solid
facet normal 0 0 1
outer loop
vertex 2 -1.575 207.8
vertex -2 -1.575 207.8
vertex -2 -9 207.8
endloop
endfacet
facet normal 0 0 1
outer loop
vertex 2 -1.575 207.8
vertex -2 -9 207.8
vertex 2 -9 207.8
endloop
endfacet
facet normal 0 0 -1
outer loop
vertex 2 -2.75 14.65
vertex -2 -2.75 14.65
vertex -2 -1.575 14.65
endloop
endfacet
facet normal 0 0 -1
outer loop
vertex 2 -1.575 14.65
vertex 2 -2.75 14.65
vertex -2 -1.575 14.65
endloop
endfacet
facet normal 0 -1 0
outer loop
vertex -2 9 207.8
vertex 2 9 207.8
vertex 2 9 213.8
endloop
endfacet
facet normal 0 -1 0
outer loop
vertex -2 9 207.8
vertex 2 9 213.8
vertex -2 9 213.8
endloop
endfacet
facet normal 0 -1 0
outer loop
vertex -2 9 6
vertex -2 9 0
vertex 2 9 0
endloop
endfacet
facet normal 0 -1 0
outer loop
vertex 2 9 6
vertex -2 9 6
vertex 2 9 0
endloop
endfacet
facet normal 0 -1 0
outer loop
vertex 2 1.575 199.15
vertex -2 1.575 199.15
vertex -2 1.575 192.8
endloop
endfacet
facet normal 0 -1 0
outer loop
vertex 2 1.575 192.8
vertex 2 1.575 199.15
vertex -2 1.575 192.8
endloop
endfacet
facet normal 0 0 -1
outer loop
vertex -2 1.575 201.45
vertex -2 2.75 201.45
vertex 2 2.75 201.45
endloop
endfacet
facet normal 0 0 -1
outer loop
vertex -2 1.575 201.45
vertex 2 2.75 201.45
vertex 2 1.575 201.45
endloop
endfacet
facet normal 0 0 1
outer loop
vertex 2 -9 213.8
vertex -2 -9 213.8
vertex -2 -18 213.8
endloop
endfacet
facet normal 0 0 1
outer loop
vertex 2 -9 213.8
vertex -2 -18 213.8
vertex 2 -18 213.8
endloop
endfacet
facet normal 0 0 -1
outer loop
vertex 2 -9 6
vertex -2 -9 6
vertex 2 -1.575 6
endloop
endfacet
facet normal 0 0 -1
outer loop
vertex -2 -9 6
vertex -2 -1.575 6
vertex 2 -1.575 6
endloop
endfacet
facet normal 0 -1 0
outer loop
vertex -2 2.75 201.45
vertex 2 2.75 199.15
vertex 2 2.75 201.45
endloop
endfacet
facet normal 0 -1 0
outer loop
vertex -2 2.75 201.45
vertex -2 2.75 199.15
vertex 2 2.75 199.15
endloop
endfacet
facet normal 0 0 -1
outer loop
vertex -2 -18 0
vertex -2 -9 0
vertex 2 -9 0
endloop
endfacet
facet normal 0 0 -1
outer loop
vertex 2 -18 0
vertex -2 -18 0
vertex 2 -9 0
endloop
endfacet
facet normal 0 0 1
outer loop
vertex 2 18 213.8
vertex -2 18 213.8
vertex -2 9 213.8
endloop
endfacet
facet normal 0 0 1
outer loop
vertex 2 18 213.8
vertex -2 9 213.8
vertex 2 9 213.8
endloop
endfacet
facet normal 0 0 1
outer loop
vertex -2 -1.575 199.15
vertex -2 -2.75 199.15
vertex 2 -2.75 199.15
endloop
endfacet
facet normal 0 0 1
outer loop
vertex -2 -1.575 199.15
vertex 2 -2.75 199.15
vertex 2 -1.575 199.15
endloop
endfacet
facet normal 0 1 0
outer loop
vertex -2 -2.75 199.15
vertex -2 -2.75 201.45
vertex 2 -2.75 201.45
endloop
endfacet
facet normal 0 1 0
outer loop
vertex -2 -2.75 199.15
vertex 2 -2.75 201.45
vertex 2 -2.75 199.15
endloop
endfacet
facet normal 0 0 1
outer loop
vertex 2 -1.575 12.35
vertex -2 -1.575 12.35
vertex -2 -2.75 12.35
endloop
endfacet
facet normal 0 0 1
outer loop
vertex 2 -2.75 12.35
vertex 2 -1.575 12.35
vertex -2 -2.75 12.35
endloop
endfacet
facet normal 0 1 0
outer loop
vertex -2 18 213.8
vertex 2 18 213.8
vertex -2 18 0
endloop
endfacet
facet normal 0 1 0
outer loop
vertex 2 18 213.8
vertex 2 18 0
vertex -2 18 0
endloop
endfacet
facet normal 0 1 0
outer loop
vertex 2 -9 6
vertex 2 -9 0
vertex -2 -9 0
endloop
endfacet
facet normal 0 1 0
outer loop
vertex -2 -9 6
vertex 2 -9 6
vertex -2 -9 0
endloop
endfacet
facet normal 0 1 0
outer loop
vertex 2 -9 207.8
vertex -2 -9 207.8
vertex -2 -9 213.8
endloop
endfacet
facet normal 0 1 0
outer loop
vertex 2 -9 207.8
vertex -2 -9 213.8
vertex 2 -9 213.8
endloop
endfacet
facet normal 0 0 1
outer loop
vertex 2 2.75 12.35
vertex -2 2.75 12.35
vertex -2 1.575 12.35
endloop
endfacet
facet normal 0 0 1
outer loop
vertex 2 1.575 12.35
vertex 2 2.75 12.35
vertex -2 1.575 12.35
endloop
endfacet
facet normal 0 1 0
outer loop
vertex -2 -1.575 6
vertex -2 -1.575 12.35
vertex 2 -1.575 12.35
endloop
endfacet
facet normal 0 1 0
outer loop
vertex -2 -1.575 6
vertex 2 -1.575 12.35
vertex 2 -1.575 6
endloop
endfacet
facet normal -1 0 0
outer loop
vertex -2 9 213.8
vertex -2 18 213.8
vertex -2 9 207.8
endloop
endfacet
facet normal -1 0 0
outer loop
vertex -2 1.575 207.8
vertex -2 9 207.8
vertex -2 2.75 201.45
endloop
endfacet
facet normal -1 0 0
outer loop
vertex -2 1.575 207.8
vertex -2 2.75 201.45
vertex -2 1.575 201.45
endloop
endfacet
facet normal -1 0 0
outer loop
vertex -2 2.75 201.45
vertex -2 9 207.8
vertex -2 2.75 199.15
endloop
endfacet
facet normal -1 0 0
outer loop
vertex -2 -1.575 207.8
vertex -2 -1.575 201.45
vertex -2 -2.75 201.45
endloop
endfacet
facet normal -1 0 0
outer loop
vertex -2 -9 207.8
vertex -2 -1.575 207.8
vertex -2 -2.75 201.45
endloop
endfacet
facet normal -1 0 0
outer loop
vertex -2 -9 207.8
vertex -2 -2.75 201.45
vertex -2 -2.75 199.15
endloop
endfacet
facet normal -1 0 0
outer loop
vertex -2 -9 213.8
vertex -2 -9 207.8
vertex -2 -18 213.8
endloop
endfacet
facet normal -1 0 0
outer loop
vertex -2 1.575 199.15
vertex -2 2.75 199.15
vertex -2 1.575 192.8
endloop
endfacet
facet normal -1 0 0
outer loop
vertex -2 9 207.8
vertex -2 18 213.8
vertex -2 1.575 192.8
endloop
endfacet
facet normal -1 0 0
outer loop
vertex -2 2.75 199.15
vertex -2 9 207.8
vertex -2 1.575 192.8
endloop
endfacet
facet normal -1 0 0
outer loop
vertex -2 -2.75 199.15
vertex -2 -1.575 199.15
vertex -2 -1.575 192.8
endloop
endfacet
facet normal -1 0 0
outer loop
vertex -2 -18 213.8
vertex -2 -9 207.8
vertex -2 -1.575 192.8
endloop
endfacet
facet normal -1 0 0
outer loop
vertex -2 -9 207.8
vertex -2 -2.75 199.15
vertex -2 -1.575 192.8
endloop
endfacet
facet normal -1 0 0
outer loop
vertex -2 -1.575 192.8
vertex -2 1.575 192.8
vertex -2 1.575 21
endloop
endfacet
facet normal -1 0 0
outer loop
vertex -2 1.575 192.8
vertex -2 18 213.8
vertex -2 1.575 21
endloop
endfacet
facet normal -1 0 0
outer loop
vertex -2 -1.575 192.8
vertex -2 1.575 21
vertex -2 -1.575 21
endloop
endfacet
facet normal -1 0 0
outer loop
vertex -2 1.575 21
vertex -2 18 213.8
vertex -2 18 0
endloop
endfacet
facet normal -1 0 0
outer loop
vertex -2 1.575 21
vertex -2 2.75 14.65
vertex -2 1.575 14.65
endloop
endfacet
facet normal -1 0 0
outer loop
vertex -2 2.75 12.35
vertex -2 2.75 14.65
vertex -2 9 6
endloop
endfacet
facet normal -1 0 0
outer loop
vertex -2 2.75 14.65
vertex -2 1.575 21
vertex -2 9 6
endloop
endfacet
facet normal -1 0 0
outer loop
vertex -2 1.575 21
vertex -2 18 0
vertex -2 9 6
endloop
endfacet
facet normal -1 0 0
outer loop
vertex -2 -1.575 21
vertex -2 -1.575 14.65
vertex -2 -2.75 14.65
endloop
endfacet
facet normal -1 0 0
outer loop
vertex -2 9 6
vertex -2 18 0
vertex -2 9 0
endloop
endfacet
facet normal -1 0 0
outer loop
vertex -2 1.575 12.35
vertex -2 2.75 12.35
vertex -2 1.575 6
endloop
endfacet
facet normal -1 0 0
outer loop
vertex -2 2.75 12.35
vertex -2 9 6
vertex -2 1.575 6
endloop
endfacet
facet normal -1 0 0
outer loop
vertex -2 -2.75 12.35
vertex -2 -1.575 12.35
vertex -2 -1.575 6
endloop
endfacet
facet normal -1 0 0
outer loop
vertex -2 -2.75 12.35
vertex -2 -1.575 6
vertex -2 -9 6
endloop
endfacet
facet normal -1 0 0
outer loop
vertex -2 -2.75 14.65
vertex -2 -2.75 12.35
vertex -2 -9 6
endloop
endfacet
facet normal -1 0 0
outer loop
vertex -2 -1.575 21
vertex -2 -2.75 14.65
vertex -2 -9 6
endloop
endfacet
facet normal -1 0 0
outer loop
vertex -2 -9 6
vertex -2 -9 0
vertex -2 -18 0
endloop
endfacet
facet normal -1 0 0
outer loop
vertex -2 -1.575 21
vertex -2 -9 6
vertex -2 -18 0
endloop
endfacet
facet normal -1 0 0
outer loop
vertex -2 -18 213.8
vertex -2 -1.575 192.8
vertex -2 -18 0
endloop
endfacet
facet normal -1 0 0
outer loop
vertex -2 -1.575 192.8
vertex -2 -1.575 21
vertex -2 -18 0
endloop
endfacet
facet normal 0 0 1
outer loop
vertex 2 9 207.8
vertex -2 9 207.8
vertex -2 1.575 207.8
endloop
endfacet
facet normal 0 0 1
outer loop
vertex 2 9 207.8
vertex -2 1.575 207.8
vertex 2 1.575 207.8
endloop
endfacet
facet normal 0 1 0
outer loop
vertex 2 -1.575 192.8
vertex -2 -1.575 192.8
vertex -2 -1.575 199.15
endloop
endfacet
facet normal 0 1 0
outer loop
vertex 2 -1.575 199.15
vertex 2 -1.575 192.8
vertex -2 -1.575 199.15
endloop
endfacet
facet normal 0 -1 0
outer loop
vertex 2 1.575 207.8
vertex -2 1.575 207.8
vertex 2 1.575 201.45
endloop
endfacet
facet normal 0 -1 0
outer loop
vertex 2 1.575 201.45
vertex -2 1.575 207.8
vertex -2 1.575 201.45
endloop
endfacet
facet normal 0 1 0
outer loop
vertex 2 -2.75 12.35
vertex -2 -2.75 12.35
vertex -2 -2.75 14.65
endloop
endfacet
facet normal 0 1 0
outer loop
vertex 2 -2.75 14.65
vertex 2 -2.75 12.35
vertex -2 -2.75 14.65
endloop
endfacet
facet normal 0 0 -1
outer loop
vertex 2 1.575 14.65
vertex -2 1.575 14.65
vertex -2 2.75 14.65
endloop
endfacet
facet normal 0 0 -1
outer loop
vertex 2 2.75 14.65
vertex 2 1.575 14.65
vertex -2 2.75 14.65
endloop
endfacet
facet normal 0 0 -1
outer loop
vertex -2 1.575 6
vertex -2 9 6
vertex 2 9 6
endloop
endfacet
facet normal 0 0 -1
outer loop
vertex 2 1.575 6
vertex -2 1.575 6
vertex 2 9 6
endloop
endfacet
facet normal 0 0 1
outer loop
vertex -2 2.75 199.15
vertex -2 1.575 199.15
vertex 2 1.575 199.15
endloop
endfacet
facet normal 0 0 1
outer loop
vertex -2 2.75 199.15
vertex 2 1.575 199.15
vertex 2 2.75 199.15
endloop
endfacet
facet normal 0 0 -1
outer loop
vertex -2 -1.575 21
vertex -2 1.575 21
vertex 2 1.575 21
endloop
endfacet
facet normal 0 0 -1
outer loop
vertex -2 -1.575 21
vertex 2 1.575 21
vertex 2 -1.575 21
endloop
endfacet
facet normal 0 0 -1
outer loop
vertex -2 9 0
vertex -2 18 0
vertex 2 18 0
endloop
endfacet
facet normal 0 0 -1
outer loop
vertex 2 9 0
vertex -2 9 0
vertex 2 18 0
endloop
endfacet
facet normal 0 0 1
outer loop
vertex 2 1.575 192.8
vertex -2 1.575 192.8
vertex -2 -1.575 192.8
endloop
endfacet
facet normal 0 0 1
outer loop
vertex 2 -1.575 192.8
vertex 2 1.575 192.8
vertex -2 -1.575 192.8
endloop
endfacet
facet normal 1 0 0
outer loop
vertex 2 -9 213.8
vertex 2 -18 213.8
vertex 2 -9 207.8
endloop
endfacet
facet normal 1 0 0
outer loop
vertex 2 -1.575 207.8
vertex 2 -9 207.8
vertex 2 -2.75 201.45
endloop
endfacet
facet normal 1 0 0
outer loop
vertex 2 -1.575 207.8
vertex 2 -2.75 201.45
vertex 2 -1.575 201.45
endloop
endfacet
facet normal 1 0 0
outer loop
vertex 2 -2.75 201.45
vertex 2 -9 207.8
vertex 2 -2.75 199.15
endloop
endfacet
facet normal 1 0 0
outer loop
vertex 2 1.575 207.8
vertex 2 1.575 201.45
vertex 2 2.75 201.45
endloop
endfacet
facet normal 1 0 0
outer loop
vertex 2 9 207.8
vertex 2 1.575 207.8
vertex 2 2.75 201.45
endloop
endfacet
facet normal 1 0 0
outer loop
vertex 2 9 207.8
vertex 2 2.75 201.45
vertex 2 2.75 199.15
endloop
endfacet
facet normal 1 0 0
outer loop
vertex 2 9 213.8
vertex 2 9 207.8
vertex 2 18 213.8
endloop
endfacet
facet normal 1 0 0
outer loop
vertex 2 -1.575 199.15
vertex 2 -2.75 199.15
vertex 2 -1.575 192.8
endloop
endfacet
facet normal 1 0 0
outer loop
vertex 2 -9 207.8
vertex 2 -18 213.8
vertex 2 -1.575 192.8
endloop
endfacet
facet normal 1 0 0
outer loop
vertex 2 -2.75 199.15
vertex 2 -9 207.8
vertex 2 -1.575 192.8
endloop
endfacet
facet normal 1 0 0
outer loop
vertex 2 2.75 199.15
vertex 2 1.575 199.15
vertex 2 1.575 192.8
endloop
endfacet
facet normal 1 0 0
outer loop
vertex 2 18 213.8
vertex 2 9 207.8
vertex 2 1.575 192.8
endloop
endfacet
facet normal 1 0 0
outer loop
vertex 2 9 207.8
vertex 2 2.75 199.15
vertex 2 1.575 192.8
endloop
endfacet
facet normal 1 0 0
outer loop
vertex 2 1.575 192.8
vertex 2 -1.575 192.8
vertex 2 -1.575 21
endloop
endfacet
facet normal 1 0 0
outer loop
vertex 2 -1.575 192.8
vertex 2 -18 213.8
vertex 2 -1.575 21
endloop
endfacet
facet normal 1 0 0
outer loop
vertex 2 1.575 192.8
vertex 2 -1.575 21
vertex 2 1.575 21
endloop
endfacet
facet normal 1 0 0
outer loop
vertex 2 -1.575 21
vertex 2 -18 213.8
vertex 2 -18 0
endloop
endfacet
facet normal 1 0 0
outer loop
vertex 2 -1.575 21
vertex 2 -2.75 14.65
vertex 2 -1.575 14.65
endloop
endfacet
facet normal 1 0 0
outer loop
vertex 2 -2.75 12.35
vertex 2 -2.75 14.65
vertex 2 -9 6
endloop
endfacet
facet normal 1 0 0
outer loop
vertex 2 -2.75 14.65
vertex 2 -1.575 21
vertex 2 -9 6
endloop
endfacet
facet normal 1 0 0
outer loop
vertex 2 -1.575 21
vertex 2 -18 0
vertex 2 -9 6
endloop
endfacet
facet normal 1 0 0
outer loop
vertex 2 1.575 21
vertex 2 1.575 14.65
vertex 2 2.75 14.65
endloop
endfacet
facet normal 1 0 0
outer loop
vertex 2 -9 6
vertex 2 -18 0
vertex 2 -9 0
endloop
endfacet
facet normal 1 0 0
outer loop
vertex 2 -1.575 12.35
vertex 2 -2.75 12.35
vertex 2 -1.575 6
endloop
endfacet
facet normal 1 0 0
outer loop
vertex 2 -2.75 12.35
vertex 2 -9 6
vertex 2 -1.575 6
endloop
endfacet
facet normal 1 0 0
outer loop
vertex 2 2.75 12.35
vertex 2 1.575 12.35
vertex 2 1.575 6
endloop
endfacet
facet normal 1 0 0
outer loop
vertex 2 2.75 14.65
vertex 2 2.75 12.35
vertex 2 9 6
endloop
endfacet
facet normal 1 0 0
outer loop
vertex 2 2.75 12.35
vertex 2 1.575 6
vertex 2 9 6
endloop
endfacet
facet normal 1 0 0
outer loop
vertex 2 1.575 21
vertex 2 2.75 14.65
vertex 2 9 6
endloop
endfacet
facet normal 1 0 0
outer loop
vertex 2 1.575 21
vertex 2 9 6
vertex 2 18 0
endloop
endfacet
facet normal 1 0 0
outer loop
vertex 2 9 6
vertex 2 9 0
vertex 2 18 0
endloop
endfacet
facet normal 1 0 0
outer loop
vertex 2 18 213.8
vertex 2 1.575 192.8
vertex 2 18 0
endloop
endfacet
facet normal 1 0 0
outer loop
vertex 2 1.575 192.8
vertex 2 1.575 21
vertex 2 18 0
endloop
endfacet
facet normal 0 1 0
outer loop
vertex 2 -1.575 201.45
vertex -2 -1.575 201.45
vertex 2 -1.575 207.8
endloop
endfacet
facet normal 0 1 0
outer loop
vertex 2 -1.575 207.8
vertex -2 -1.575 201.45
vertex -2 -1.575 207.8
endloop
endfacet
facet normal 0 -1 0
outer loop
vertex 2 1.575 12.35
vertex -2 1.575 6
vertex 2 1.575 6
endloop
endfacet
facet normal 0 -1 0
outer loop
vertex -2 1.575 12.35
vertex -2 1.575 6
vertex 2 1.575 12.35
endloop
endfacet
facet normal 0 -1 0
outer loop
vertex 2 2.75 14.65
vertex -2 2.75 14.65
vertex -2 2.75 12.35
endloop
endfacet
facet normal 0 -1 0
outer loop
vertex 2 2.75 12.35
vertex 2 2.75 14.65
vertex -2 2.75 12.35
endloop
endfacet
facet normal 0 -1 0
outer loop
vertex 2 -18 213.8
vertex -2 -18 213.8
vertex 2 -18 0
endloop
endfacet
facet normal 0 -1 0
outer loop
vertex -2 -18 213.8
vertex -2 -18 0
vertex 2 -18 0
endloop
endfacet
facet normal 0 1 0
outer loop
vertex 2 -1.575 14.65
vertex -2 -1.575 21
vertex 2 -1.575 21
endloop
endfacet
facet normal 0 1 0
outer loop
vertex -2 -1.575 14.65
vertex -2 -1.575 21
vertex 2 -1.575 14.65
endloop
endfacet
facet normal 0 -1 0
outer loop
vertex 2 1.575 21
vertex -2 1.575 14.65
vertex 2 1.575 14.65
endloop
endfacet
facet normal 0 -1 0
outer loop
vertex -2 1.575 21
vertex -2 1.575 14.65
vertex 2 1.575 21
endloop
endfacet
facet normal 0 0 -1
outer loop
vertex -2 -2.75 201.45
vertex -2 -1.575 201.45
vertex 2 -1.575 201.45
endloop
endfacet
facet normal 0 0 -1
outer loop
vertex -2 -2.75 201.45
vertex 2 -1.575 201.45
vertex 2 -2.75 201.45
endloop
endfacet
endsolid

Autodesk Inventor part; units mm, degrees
ref_plane "YZ Plane" through (0, 0, 0) normal (1, 0, 0) x (0, 1, 0)
ref_plane "XZ Plane" through (0, 0, 0) normal (0, 1, 0) x (-1, 0, 0)
ref_plane "XY Plane" through (0, 0, 0) normal (0, 0, 1) x (1, 0, 0)
sketch "Эскиз1" plane through (0, 0, 0) normal (0, 0, 1) x (1, 0, 0)
  line L0 (-2, 18) -> (2, 18)
  line L1 (2, -18) -> (-2, -18)
  line L2 (-2, 18) -> (2, -18) construction
  line L3 (2, 18) -> (-2, -18) construction
  line L4 (-2, 9) -> (2, 9)
  line L5 (2, -9) -> (-2, -9)
  line L6 (-2, 9) -> (2, -9) construction
  line L7 (2, 9) -> (-2, -9) construction
  line L8 (-2, -18) -> (-2, -9)
  line L9 (-2, 9) -> (-2, 18)
  line L10 (2, 18) -> (2, 9)
  line L11 (2, -9) -> (2, -18)
  point P0 (0, 0)
  dimension "d4" = 36
  dimension "d5" = 4
extrude "Выдавливание1" add sketch "Эскиз1" along normal blind 6
sketch "Эскиз2" plane through (0, 0, 6) normal (0, 0, 1) x (1, 0, 0)
  line L0 (-2, -18) -> (2, -18) projected
  line L1 (2, 18) -> (-2, 18) projected
  line L2 (-2, -18) -> (2, -18)
  line L3 (2, -18) -> (2, 18)
  line L4 (2, 18) -> (-2, 18)
  line L5 (-2, 18) -> (-2, -18)
  point P0 (0, 0)
extrude "Выдавливание2" add sketch "Эскиз2" along normal blind 201.8
sketch "Эскиз4" plane through (0, 0, 207.8) normal (0, 0, 1) x (1, 0, 0)
  line L0 (2, 18) -> (-2, 18) projected
  line L1 (-2, -18) -> (2, -18) projected
  line L2 (-2, 18) -> (2, 18)
  line L3 (2, -18) -> (-2, -18)
  line L4 (-2, 9) -> (-2, -9) projected
  line L5 (2, 9) -> (-2, 9)
  line L6 (-2, -9) -> (2, -9)
  line L7 (2, 9) -> (-2, -9) construction
  line L8 (-2, 9) -> (2, -9) construction
  line L9 (2, 18) -> (2, 9)
  line L10 (2, -9) -> (2, -18)
  line L11 (-2, -18) -> (-2, -9)
  line L12 (-2, 9) -> (-2, 18)
  point P0 (0, 0)
extrude "Выдавливание3" add sketch "Эскиз4" along normal blind 6
sketch "Эскиз5" plane through (-2, -18, 0) normal (-1, 0, 0) x (0, 0, 1)
  line L0 (106.9, -127.9343) -> (106.9, 327.3325) construction
  line L1 (207.8, 27) -> (207.8, 9) projected
  line L2 (192.8, 19.575) -> (192.8, 16.425)
  line L3 (207.8, 16.425) -> (207.8, 19.575)
  line L4 (207.8, 19.575) -> (192.8, 16.425) construction
  line L5 (192.8, 19.575) -> (207.8, 16.425) construction
  line L6 (201.45, 15.25) -> (199.15, 15.25)
  line L7 (199.15, 20.75) -> (201.45, 20.75)
  line L8 (201.45, 15.25) -> (199.15, 20.75) construction
  line L9 (199.15, 15.25) -> (201.45, 20.75) construction
  line L10 (201.45, 20.75) -> (201.45, 19.575)
  line L11 (201.45, 16.425) -> (201.45, 15.25)
  line L12 (207.8, 19.575) -> (201.45, 19.575)
  line L13 (199.15, 19.575) -> (192.8, 19.575)
  line L14 (192.8, 16.425) -> (199.15, 16.425)
  line L15 (201.45, 16.425) -> (207.8, 16.425)
  line L16 (199.15, 15.25) -> (199.15, 16.425)
  line L17 (199.15, 19.575) -> (199.15, 20.75)
  line L18 (6, 27) -> (6, 9)
  line L19 (21, 19.575) -> (21, 16.425)
  line L20 (6, 16.425) -> (6, 19.575)
  line L21 (6, 19.575) -> (21, 16.425) construction
  line L22 (21, 19.575) -> (6, 16.425) construction
  line L23 (12.35, 15.25) -> (14.65, 15.25)
  line L24 (14.65, 20.75) -> (12.35, 20.75)
  line L25 (12.35, 15.25) -> (14.65, 20.75) construction
  line L26 (14.65, 15.25) -> (12.35, 20.75) construction
  line L27 (12.35, 20.75) -> (12.35, 19.575)
  line L28 (12.35, 16.425) -> (12.35, 15.25)
  line L29 (6, 19.575) -> (12.35, 19.575)
  line L30 (14.65, 19.575) -> (21, 19.575)
  line L31 (21, 16.425) -> (14.65, 16.425)
  line L32 (12.35, 16.425) -> (6, 16.425)
  line L33 (14.65, 15.25) -> (14.65, 16.425)
  line L34 (14.65, 19.575) -> (14.65, 20.75)
  point P0 (6, 27)
  point P1 (6, 9)
  point P2 (200.3, 18)
  point P3 (207.8, 18)
  point P4 (13.5, 18)
  point P5 (6, 18)
  point P6 (207.8, 19.575)
  dimension "d25" = 15
  dimension "d26" = 3.15
  dimension "d27" = 2.3
  dimension "d28" = 5.5
extrude "Выдавливание4" cut sketch "Эскиз5" against normal blind 6
properties part number "ребро"
